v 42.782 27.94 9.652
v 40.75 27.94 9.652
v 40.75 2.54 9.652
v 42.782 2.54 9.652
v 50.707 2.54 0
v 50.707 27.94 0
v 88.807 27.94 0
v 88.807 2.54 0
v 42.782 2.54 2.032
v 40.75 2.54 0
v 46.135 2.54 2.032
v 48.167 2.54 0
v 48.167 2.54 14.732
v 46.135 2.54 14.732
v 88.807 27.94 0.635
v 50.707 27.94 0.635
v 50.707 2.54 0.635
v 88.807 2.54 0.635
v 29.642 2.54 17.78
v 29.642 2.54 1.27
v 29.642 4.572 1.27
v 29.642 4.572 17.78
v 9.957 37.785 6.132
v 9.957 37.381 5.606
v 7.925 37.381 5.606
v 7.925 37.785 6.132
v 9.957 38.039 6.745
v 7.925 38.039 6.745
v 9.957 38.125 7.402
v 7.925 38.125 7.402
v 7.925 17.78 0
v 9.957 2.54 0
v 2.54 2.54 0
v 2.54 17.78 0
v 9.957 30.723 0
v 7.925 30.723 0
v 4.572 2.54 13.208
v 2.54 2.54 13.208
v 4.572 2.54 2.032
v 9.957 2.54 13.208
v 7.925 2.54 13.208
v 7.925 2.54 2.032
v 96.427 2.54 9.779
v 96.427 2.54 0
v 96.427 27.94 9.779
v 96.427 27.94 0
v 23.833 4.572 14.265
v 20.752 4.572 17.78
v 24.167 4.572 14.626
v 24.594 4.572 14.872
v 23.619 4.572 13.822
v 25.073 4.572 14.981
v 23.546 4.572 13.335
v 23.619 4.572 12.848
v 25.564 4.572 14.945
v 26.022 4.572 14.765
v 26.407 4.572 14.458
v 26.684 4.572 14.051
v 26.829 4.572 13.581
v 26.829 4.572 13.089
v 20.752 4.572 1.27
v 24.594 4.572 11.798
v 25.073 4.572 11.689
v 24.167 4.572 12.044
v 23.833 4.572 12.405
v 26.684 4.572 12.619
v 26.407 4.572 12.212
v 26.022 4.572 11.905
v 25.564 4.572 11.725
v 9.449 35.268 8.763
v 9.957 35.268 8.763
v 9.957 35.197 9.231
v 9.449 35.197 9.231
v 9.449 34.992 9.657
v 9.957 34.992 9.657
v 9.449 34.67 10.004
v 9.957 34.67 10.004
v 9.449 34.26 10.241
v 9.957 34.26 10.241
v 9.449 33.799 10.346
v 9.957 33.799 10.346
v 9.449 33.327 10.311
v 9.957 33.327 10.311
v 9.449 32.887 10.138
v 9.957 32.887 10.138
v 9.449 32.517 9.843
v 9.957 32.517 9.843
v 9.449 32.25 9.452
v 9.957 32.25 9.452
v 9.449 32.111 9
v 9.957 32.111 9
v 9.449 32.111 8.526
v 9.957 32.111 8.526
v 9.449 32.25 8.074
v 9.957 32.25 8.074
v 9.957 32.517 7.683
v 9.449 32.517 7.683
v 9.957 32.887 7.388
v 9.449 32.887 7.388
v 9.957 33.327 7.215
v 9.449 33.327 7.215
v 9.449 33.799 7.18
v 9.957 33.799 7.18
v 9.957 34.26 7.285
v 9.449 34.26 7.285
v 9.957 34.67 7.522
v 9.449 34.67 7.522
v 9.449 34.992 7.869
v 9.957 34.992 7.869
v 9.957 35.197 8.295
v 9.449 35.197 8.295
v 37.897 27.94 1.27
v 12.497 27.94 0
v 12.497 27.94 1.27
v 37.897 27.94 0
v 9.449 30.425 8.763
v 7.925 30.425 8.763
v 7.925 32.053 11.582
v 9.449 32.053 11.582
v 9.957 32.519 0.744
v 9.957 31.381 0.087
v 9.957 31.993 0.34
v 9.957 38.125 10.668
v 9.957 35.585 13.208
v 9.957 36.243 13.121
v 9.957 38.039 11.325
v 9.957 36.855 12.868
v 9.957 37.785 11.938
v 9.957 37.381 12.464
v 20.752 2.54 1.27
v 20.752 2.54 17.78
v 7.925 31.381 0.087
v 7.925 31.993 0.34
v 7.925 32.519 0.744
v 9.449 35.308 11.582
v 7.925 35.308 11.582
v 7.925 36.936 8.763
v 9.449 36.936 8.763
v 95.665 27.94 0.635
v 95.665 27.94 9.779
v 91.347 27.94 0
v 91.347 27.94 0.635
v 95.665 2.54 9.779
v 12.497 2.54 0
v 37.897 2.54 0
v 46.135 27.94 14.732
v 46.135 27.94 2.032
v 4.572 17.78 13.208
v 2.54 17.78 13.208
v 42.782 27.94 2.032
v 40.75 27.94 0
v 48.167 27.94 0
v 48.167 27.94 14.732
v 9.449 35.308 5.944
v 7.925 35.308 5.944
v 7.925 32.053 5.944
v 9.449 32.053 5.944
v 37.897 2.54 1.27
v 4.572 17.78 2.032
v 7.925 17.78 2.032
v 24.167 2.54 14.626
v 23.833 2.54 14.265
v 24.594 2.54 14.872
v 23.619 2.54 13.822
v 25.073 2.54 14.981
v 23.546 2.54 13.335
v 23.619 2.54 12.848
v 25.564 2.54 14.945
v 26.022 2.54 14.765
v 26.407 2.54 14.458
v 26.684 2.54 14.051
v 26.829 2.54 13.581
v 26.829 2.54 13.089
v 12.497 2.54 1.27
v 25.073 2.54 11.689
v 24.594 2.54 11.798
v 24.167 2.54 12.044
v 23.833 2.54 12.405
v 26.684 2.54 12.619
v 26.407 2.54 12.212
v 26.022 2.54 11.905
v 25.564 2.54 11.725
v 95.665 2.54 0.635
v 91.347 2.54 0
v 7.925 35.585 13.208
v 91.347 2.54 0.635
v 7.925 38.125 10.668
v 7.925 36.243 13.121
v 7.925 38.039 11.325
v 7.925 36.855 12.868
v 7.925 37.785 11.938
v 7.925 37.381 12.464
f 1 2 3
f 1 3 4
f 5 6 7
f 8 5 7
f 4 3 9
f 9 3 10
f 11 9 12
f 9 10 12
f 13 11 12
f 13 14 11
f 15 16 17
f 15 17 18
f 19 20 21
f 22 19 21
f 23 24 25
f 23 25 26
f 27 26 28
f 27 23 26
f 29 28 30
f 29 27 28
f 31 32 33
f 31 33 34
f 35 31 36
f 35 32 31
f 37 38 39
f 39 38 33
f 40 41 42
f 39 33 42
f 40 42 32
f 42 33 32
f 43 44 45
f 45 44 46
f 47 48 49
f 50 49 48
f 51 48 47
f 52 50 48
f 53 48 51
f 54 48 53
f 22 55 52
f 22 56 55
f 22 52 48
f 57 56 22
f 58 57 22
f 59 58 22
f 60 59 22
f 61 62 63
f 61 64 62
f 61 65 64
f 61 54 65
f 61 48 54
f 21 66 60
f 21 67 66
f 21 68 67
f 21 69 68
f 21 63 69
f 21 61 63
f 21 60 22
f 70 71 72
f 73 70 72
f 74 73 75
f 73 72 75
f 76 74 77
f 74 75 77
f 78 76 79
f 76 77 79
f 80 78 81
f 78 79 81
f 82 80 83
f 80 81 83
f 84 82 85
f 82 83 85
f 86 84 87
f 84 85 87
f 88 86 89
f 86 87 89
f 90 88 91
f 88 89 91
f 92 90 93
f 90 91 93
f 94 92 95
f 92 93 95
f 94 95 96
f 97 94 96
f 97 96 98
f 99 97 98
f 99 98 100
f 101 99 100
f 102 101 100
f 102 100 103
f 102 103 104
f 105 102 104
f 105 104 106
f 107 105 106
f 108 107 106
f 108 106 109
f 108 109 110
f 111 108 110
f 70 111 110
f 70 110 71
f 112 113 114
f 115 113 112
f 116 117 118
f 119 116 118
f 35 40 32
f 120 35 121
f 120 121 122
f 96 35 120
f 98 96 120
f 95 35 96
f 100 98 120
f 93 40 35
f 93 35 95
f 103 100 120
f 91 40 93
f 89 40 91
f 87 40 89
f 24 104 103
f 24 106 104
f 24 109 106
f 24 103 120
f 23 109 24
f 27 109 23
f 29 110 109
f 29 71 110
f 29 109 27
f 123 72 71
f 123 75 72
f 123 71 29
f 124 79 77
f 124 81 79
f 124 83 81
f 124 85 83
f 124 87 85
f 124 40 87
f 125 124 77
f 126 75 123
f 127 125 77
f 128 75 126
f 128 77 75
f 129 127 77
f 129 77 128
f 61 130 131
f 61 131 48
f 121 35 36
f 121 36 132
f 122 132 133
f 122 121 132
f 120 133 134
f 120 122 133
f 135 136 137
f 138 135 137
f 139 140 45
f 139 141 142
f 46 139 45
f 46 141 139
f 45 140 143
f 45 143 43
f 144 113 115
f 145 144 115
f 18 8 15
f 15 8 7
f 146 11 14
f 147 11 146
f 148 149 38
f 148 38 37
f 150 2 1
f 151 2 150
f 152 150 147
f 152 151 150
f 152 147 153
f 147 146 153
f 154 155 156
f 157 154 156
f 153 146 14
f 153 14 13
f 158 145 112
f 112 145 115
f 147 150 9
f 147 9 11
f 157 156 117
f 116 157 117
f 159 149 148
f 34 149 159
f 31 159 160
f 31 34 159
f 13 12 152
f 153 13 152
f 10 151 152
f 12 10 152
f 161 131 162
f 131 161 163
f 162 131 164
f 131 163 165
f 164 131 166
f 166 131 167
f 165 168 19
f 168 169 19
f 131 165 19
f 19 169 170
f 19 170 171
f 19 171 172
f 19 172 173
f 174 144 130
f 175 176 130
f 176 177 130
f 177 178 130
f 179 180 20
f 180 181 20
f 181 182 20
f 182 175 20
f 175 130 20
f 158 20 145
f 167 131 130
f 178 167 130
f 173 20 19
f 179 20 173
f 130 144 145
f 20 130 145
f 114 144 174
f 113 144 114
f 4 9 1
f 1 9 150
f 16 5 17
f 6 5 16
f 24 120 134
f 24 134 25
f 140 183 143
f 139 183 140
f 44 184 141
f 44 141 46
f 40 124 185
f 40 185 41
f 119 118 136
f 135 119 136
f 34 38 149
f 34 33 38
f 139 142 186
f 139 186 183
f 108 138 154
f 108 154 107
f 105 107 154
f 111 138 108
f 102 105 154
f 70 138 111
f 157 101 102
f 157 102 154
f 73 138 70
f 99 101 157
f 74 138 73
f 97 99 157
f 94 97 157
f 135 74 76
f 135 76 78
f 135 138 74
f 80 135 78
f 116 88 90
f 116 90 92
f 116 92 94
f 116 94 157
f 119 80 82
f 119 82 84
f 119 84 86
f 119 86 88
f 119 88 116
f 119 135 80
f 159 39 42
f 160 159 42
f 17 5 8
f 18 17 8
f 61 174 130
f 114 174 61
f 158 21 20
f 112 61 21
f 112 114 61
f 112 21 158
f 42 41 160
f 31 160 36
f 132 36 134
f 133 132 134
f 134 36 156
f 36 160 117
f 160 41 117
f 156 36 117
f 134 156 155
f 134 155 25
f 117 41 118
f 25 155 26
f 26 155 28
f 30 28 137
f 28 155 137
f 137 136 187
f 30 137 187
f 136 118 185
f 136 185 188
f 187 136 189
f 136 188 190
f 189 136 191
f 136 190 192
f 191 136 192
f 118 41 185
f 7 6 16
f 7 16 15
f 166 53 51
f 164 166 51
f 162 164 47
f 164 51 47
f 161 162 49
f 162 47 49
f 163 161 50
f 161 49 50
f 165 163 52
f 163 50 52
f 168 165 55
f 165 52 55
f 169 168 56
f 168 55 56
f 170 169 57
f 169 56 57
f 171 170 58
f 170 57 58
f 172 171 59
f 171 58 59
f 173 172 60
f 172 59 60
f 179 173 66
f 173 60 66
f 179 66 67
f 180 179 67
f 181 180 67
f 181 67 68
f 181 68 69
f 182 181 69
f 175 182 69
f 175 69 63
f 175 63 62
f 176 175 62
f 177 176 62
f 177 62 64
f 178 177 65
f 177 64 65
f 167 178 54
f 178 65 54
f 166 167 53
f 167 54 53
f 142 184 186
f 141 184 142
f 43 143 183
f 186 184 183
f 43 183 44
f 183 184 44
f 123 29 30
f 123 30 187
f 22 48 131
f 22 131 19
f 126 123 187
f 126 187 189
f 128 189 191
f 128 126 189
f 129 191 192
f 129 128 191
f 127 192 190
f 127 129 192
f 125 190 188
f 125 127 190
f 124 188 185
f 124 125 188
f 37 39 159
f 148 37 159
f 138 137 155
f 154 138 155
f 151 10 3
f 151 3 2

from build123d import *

# Parameters (mm, degrees)
F0_W      = 7.4168
F0_H      = 15.24
F1_DEPTH  = 2.032
F2_W      = 2.032
F2_H      = 15.24
F3_DEPTH  = 11.176
F4_R      = 1.5875
F5_DEPTH  = 2.032
F7_DEPTH  = 1.524
F8_W      = 25.4
F8_H      = 25.4
F9_DEPTH  = 1.27
F10_W     = 8.89
F10_H     = 2.032
F11_DEPTH = 16.51
F12_R     = 1.651
F13_DEPTH = 2.032
F14_W     = 7.4168
F14_H     = 25.4
F15_DEPTH = 2.032
F16_W     = 2.032
F16_H     = 25.4
F17_DEPTH = 12.7
F18_W     = 2.032
F18_H     = 5.08
F19_DEPTH = 25.4
F20_W     = 38.1
F20_H     = 25.4
F20_W_2   = 5.08
F21_DEPTH = 0.635
F22_W     = 0.762
F22_H     = 25.4
F23_DEPTH = 9.144


with BuildPart() as f1:
    # F0 (on Top) → F1 (new body)
    with BuildSketch(Plane.XY):
        with Locations((6.2484, 10.16)):
            Rectangle(F0_W, F0_H)
    extrude(amount=F1_DEPTH)

    # F2 (on face) → F3 (join)
    with BuildSketch(Plane.XY.offset(2.032)):
        with Locations((3.556, 10.16)):
            Rectangle(F2_W, F2_H)
        with Locations((8.9408, 10.16)):
            Rectangle(F2_W, F2_H)
    extrude(amount=F3_DEPTH)

    # F4 (on face) → F5 (join)
    with BuildSketch(Plane.YZ.offset(9.9568)):
        with BuildLine():
            Line((17.78, 13.208), (17.78, 0))
            Line((17.78, 0), (30.723298, 0))
            ThreePointArc((30.723298, 0), (31.695313, 0.193346), (32.519349, 0.743949))
            Line((32.519349, 0.743949), (37.381451, 5.606051))
            ThreePointArc((37.381451, 5.606051), (37.932054, 6.430087), (38.1254, 7.402102))
            Line((38.1254, 7.402102), (38.1254, 10.668))
            ThreePointArc((38.1254, 10.668), (37.381451, 12.464051), (35.5854, 13.208))
            Line((35.5854, 13.208), (17.78, 13.208))
        make_face()
        with Locations((33.6804, 8.763)):
            Circle(F4_R, mode=Mode.SUBTRACT)
    extrude(amount=-F5_DEPTH)

    # F6 (on face) → F7 (cut)
    with BuildSketch(Plane(origin=(7.9248, 0, 0), x_dir=(0, -1, 0), z_dir=(-1, 0, 0))):
        Polygon((-35.308181, 11.5824), (-36.935963, 8.763), (-35.308181, 5.9436), (-32.052619, 5.9436), (-30.424837, 8.763), (-32.052619, 11.5824), align=None)
    extrude(amount=-F7_DEPTH, mode=Mode.SUBTRACT)


with BuildPart() as f9:
    # F8 (on Top) → F9 (new body)
    with BuildSketch(Plane.XY):
        with Locations((25.1968, 15.24)):
            Rectangle(F8_W, F8_H)
    extrude(amount=F9_DEPTH)

    # F10 (on face) → F11 (join)
    with BuildSketch(Plane.XY.offset(1.27)):
        with Locations((25.1968, 3.556)):
            Rectangle(F10_W, F10_H)
    extrude(amount=F11_DEPTH)

    # F12 (on face) → F13 (cut, through all)
    with BuildSketch(Plane(origin=(0, 4.572, 0), x_dir=(-1, 0, 0), z_dir=(0, 1, 0))):
        with Locations((-25.1968, 13.335)):
            Circle(F12_R)
    extrude(amount=-F13_DEPTH, mode=Mode.SUBTRACT)


with BuildPart() as f15:
    # F14 (on Top) → F15 (new body)
    with BuildSketch(Plane.XY):
        with Locations((44.458451, 15.24)):
            Rectangle(F14_W, F14_H)
    extrude(amount=F15_DEPTH)

    # F16 (on face) → F17 (join)
    with BuildSketch(Plane.XY.offset(2.032)):
        with Locations((41.766051, 15.24)):
            Rectangle(F16_W, F16_H)
        with Locations((47.150851, 15.24)):
            Rectangle(F16_W, F16_H)
    extrude(amount=F17_DEPTH)

    # F18 (on face) → F19 (cut, through all)
    with BuildSketch(Plane.XZ.offset(-2.54)):
        with Locations((41.766051, 12.192)):
            Rectangle(F18_W, F18_H)
    extrude(amount=-F19_DEPTH, mode=Mode.SUBTRACT)


with BuildPart() as f21:
    # F20 (on Top) → F21 (new body)
    with BuildSketch(Plane.XY):
        with Locations((69.756851, 15.24)):
            Rectangle(F20_W, F20_H)
        with Locations((93.886851, 15.24)):
            Rectangle(F20_W_2, F20_H)
    extrude(amount=F21_DEPTH)

    # F22 (on face) → F23 (join)
    with BuildSketch(Plane.XY.offset(0.635)):
        with Locations((96.045851, 15.24)):
            Rectangle(F22_W, F22_H)
    extrude(amount=F23_DEPTH)


solid = Compound([f1.part, f9.part, f15.part, f21.part])
